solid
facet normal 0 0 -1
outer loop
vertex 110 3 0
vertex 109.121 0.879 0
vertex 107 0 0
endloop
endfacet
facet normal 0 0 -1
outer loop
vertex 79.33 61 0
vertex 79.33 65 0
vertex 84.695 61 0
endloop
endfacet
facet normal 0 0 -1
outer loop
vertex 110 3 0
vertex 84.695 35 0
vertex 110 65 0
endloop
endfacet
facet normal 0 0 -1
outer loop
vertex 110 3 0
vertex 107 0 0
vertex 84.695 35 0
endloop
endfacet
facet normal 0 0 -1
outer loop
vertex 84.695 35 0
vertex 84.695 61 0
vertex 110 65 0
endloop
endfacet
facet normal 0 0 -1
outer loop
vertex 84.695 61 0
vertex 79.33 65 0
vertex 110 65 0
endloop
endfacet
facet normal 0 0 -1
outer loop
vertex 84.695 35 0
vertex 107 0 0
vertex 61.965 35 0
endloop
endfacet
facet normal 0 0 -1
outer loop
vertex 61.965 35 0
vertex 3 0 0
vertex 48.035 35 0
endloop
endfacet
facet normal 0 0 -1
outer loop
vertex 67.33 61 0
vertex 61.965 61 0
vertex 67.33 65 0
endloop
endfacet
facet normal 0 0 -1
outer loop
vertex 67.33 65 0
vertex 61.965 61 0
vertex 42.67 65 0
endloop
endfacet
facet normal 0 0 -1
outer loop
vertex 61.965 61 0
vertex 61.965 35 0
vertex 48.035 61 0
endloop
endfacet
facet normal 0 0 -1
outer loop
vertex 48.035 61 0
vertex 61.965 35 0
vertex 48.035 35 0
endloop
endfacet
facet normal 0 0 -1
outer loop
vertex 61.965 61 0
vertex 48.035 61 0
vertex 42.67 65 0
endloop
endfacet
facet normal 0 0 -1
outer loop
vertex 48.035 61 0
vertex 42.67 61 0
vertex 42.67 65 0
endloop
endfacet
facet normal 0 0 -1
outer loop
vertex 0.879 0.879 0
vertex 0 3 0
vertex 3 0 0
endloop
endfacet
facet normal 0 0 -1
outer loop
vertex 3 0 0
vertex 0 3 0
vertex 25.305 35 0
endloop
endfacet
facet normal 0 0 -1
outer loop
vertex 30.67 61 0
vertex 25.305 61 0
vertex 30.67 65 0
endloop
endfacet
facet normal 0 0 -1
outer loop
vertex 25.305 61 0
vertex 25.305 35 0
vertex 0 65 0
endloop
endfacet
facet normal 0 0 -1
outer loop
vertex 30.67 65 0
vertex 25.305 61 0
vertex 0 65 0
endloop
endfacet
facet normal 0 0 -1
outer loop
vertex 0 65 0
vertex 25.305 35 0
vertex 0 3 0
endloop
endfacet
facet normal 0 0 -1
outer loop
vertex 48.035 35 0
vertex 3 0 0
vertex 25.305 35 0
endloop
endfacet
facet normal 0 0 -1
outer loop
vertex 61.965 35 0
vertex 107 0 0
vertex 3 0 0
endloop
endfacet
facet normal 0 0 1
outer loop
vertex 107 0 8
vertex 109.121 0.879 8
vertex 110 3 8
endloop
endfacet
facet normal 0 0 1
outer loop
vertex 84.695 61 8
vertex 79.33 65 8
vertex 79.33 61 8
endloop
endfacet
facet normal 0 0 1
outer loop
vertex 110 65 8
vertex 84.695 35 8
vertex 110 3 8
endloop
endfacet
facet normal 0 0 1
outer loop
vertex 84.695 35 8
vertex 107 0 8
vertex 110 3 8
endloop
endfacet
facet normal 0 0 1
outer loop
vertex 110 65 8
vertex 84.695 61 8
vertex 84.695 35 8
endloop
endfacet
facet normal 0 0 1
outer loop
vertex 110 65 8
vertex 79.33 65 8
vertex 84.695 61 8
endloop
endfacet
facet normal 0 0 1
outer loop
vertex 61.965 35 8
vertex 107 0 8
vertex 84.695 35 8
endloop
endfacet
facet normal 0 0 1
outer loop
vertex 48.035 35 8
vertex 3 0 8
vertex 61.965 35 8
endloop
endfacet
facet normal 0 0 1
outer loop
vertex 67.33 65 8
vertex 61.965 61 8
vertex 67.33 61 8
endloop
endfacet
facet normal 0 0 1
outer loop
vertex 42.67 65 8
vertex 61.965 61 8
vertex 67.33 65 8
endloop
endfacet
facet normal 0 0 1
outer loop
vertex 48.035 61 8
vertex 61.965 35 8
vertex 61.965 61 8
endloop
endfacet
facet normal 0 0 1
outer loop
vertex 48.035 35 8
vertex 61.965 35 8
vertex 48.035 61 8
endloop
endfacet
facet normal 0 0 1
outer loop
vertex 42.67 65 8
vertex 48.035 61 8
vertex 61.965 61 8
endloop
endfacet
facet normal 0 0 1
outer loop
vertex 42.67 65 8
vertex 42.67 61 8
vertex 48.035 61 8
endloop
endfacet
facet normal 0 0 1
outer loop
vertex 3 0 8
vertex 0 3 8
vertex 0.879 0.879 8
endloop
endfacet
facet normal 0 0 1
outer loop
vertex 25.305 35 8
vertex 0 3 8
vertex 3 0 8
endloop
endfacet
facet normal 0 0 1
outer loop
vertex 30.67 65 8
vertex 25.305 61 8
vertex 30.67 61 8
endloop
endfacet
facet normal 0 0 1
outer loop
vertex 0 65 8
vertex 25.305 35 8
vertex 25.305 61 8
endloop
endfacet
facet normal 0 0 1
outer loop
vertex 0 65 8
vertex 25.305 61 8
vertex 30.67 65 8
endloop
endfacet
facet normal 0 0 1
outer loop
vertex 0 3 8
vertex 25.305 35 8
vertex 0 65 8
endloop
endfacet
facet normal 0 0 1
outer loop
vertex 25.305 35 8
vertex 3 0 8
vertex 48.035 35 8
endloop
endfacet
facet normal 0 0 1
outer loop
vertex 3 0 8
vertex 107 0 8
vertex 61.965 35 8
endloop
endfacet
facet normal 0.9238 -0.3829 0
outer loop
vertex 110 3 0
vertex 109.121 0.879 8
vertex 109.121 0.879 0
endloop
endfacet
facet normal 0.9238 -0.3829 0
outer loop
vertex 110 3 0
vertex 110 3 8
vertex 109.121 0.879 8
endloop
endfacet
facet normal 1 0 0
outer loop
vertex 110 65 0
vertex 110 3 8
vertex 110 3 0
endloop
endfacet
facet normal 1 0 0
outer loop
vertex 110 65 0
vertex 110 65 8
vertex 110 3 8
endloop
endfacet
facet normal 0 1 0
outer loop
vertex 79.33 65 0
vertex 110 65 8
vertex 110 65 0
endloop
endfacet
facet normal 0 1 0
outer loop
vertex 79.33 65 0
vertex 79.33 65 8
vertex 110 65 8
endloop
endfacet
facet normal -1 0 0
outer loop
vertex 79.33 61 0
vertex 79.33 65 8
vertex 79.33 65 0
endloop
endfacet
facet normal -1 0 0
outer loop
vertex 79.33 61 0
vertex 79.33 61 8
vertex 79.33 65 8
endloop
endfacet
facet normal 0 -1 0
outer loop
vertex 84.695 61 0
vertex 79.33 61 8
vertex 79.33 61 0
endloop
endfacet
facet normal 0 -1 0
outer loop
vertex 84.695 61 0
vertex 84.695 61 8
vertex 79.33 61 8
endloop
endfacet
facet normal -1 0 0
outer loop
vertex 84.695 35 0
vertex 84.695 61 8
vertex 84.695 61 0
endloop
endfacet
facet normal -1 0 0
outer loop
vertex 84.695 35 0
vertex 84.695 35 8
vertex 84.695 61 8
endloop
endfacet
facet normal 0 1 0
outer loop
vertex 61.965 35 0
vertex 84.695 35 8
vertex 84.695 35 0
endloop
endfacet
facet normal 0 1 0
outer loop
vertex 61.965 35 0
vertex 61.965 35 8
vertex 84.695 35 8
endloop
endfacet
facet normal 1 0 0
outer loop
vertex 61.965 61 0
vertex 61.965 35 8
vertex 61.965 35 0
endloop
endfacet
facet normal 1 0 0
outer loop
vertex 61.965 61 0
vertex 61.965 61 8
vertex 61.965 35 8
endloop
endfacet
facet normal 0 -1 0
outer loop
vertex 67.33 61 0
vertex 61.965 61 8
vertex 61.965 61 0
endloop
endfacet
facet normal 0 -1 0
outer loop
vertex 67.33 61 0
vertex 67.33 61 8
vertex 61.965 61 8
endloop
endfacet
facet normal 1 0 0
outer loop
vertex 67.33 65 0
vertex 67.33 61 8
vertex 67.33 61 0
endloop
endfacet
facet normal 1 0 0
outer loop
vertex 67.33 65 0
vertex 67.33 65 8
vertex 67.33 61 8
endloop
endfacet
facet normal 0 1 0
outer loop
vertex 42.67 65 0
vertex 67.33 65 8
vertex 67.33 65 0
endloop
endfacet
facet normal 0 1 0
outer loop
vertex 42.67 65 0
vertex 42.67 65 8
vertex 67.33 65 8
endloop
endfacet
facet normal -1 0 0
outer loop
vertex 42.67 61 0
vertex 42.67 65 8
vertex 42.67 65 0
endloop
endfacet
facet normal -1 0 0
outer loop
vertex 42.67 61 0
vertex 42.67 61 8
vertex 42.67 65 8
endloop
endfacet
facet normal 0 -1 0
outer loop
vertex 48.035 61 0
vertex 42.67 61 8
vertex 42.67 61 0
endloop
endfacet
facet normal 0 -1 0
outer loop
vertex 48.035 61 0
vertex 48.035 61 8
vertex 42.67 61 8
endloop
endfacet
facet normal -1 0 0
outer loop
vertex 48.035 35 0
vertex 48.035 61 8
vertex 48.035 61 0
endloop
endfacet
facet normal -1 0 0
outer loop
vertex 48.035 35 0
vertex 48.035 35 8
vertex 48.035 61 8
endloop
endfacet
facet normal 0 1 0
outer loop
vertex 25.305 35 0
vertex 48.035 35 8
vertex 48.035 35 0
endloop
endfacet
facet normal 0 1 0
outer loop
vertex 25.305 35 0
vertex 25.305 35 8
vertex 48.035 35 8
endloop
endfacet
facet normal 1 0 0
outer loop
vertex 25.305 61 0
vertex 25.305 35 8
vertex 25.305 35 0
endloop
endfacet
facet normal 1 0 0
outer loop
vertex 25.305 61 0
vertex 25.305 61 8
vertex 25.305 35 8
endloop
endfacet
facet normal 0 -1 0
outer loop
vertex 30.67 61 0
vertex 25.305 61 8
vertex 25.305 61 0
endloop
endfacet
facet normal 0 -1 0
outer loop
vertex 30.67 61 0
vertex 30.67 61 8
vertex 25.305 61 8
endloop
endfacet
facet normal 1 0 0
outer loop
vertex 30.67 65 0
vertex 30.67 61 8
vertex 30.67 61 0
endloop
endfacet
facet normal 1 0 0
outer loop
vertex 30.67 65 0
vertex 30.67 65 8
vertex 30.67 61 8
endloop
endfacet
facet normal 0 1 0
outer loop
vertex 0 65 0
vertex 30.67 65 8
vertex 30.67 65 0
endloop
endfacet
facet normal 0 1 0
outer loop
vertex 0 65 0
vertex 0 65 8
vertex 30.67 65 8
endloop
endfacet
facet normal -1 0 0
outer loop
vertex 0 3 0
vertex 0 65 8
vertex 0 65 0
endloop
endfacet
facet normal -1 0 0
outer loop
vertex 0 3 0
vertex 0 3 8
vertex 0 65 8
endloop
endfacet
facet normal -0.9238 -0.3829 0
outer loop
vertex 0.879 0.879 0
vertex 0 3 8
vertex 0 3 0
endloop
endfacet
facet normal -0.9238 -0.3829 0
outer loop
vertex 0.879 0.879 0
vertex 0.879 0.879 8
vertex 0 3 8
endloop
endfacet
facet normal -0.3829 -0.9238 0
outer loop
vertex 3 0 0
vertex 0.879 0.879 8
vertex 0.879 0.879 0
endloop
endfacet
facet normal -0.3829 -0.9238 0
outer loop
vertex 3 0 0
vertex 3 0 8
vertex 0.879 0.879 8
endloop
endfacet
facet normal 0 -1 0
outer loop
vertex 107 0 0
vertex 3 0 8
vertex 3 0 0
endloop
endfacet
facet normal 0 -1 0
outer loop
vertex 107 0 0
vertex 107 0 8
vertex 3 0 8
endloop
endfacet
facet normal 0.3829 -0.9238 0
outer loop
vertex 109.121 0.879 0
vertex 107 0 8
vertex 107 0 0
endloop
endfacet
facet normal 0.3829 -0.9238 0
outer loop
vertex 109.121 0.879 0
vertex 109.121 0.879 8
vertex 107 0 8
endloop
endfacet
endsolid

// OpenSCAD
$fn = 32;

// ----------------------------------------------------------------------
// Window plate: 110 x 65 mm, 2 open windows
// ----------------------------------------------------------------------

// --- parameters (mm) ---
profile_height = 8;       // extrusion height
profile_points = 24;      // points of the closed outline

profile = [[0, 3], [0.879, 0.879], [3, 0], [107, 0], [109.121, 0.879], [110, 3], [110, 65], [79.33, 65], [79.33, 61], [84.695, 61], [84.695, 35], [61.965, 35], [61.965, 61], [67.33, 61], [67.33, 65], [42.67, 65], [42.67, 61], [48.035, 61], [48.035, 35], [25.305, 35], [25.305, 61], [30.67, 61], [30.67, 65], [0, 65]];  // single closed polygon, 24 points, counter clockwise

// --- the one profile operation ---
linear_extrude(height = profile_height) polygon(points = profile);
